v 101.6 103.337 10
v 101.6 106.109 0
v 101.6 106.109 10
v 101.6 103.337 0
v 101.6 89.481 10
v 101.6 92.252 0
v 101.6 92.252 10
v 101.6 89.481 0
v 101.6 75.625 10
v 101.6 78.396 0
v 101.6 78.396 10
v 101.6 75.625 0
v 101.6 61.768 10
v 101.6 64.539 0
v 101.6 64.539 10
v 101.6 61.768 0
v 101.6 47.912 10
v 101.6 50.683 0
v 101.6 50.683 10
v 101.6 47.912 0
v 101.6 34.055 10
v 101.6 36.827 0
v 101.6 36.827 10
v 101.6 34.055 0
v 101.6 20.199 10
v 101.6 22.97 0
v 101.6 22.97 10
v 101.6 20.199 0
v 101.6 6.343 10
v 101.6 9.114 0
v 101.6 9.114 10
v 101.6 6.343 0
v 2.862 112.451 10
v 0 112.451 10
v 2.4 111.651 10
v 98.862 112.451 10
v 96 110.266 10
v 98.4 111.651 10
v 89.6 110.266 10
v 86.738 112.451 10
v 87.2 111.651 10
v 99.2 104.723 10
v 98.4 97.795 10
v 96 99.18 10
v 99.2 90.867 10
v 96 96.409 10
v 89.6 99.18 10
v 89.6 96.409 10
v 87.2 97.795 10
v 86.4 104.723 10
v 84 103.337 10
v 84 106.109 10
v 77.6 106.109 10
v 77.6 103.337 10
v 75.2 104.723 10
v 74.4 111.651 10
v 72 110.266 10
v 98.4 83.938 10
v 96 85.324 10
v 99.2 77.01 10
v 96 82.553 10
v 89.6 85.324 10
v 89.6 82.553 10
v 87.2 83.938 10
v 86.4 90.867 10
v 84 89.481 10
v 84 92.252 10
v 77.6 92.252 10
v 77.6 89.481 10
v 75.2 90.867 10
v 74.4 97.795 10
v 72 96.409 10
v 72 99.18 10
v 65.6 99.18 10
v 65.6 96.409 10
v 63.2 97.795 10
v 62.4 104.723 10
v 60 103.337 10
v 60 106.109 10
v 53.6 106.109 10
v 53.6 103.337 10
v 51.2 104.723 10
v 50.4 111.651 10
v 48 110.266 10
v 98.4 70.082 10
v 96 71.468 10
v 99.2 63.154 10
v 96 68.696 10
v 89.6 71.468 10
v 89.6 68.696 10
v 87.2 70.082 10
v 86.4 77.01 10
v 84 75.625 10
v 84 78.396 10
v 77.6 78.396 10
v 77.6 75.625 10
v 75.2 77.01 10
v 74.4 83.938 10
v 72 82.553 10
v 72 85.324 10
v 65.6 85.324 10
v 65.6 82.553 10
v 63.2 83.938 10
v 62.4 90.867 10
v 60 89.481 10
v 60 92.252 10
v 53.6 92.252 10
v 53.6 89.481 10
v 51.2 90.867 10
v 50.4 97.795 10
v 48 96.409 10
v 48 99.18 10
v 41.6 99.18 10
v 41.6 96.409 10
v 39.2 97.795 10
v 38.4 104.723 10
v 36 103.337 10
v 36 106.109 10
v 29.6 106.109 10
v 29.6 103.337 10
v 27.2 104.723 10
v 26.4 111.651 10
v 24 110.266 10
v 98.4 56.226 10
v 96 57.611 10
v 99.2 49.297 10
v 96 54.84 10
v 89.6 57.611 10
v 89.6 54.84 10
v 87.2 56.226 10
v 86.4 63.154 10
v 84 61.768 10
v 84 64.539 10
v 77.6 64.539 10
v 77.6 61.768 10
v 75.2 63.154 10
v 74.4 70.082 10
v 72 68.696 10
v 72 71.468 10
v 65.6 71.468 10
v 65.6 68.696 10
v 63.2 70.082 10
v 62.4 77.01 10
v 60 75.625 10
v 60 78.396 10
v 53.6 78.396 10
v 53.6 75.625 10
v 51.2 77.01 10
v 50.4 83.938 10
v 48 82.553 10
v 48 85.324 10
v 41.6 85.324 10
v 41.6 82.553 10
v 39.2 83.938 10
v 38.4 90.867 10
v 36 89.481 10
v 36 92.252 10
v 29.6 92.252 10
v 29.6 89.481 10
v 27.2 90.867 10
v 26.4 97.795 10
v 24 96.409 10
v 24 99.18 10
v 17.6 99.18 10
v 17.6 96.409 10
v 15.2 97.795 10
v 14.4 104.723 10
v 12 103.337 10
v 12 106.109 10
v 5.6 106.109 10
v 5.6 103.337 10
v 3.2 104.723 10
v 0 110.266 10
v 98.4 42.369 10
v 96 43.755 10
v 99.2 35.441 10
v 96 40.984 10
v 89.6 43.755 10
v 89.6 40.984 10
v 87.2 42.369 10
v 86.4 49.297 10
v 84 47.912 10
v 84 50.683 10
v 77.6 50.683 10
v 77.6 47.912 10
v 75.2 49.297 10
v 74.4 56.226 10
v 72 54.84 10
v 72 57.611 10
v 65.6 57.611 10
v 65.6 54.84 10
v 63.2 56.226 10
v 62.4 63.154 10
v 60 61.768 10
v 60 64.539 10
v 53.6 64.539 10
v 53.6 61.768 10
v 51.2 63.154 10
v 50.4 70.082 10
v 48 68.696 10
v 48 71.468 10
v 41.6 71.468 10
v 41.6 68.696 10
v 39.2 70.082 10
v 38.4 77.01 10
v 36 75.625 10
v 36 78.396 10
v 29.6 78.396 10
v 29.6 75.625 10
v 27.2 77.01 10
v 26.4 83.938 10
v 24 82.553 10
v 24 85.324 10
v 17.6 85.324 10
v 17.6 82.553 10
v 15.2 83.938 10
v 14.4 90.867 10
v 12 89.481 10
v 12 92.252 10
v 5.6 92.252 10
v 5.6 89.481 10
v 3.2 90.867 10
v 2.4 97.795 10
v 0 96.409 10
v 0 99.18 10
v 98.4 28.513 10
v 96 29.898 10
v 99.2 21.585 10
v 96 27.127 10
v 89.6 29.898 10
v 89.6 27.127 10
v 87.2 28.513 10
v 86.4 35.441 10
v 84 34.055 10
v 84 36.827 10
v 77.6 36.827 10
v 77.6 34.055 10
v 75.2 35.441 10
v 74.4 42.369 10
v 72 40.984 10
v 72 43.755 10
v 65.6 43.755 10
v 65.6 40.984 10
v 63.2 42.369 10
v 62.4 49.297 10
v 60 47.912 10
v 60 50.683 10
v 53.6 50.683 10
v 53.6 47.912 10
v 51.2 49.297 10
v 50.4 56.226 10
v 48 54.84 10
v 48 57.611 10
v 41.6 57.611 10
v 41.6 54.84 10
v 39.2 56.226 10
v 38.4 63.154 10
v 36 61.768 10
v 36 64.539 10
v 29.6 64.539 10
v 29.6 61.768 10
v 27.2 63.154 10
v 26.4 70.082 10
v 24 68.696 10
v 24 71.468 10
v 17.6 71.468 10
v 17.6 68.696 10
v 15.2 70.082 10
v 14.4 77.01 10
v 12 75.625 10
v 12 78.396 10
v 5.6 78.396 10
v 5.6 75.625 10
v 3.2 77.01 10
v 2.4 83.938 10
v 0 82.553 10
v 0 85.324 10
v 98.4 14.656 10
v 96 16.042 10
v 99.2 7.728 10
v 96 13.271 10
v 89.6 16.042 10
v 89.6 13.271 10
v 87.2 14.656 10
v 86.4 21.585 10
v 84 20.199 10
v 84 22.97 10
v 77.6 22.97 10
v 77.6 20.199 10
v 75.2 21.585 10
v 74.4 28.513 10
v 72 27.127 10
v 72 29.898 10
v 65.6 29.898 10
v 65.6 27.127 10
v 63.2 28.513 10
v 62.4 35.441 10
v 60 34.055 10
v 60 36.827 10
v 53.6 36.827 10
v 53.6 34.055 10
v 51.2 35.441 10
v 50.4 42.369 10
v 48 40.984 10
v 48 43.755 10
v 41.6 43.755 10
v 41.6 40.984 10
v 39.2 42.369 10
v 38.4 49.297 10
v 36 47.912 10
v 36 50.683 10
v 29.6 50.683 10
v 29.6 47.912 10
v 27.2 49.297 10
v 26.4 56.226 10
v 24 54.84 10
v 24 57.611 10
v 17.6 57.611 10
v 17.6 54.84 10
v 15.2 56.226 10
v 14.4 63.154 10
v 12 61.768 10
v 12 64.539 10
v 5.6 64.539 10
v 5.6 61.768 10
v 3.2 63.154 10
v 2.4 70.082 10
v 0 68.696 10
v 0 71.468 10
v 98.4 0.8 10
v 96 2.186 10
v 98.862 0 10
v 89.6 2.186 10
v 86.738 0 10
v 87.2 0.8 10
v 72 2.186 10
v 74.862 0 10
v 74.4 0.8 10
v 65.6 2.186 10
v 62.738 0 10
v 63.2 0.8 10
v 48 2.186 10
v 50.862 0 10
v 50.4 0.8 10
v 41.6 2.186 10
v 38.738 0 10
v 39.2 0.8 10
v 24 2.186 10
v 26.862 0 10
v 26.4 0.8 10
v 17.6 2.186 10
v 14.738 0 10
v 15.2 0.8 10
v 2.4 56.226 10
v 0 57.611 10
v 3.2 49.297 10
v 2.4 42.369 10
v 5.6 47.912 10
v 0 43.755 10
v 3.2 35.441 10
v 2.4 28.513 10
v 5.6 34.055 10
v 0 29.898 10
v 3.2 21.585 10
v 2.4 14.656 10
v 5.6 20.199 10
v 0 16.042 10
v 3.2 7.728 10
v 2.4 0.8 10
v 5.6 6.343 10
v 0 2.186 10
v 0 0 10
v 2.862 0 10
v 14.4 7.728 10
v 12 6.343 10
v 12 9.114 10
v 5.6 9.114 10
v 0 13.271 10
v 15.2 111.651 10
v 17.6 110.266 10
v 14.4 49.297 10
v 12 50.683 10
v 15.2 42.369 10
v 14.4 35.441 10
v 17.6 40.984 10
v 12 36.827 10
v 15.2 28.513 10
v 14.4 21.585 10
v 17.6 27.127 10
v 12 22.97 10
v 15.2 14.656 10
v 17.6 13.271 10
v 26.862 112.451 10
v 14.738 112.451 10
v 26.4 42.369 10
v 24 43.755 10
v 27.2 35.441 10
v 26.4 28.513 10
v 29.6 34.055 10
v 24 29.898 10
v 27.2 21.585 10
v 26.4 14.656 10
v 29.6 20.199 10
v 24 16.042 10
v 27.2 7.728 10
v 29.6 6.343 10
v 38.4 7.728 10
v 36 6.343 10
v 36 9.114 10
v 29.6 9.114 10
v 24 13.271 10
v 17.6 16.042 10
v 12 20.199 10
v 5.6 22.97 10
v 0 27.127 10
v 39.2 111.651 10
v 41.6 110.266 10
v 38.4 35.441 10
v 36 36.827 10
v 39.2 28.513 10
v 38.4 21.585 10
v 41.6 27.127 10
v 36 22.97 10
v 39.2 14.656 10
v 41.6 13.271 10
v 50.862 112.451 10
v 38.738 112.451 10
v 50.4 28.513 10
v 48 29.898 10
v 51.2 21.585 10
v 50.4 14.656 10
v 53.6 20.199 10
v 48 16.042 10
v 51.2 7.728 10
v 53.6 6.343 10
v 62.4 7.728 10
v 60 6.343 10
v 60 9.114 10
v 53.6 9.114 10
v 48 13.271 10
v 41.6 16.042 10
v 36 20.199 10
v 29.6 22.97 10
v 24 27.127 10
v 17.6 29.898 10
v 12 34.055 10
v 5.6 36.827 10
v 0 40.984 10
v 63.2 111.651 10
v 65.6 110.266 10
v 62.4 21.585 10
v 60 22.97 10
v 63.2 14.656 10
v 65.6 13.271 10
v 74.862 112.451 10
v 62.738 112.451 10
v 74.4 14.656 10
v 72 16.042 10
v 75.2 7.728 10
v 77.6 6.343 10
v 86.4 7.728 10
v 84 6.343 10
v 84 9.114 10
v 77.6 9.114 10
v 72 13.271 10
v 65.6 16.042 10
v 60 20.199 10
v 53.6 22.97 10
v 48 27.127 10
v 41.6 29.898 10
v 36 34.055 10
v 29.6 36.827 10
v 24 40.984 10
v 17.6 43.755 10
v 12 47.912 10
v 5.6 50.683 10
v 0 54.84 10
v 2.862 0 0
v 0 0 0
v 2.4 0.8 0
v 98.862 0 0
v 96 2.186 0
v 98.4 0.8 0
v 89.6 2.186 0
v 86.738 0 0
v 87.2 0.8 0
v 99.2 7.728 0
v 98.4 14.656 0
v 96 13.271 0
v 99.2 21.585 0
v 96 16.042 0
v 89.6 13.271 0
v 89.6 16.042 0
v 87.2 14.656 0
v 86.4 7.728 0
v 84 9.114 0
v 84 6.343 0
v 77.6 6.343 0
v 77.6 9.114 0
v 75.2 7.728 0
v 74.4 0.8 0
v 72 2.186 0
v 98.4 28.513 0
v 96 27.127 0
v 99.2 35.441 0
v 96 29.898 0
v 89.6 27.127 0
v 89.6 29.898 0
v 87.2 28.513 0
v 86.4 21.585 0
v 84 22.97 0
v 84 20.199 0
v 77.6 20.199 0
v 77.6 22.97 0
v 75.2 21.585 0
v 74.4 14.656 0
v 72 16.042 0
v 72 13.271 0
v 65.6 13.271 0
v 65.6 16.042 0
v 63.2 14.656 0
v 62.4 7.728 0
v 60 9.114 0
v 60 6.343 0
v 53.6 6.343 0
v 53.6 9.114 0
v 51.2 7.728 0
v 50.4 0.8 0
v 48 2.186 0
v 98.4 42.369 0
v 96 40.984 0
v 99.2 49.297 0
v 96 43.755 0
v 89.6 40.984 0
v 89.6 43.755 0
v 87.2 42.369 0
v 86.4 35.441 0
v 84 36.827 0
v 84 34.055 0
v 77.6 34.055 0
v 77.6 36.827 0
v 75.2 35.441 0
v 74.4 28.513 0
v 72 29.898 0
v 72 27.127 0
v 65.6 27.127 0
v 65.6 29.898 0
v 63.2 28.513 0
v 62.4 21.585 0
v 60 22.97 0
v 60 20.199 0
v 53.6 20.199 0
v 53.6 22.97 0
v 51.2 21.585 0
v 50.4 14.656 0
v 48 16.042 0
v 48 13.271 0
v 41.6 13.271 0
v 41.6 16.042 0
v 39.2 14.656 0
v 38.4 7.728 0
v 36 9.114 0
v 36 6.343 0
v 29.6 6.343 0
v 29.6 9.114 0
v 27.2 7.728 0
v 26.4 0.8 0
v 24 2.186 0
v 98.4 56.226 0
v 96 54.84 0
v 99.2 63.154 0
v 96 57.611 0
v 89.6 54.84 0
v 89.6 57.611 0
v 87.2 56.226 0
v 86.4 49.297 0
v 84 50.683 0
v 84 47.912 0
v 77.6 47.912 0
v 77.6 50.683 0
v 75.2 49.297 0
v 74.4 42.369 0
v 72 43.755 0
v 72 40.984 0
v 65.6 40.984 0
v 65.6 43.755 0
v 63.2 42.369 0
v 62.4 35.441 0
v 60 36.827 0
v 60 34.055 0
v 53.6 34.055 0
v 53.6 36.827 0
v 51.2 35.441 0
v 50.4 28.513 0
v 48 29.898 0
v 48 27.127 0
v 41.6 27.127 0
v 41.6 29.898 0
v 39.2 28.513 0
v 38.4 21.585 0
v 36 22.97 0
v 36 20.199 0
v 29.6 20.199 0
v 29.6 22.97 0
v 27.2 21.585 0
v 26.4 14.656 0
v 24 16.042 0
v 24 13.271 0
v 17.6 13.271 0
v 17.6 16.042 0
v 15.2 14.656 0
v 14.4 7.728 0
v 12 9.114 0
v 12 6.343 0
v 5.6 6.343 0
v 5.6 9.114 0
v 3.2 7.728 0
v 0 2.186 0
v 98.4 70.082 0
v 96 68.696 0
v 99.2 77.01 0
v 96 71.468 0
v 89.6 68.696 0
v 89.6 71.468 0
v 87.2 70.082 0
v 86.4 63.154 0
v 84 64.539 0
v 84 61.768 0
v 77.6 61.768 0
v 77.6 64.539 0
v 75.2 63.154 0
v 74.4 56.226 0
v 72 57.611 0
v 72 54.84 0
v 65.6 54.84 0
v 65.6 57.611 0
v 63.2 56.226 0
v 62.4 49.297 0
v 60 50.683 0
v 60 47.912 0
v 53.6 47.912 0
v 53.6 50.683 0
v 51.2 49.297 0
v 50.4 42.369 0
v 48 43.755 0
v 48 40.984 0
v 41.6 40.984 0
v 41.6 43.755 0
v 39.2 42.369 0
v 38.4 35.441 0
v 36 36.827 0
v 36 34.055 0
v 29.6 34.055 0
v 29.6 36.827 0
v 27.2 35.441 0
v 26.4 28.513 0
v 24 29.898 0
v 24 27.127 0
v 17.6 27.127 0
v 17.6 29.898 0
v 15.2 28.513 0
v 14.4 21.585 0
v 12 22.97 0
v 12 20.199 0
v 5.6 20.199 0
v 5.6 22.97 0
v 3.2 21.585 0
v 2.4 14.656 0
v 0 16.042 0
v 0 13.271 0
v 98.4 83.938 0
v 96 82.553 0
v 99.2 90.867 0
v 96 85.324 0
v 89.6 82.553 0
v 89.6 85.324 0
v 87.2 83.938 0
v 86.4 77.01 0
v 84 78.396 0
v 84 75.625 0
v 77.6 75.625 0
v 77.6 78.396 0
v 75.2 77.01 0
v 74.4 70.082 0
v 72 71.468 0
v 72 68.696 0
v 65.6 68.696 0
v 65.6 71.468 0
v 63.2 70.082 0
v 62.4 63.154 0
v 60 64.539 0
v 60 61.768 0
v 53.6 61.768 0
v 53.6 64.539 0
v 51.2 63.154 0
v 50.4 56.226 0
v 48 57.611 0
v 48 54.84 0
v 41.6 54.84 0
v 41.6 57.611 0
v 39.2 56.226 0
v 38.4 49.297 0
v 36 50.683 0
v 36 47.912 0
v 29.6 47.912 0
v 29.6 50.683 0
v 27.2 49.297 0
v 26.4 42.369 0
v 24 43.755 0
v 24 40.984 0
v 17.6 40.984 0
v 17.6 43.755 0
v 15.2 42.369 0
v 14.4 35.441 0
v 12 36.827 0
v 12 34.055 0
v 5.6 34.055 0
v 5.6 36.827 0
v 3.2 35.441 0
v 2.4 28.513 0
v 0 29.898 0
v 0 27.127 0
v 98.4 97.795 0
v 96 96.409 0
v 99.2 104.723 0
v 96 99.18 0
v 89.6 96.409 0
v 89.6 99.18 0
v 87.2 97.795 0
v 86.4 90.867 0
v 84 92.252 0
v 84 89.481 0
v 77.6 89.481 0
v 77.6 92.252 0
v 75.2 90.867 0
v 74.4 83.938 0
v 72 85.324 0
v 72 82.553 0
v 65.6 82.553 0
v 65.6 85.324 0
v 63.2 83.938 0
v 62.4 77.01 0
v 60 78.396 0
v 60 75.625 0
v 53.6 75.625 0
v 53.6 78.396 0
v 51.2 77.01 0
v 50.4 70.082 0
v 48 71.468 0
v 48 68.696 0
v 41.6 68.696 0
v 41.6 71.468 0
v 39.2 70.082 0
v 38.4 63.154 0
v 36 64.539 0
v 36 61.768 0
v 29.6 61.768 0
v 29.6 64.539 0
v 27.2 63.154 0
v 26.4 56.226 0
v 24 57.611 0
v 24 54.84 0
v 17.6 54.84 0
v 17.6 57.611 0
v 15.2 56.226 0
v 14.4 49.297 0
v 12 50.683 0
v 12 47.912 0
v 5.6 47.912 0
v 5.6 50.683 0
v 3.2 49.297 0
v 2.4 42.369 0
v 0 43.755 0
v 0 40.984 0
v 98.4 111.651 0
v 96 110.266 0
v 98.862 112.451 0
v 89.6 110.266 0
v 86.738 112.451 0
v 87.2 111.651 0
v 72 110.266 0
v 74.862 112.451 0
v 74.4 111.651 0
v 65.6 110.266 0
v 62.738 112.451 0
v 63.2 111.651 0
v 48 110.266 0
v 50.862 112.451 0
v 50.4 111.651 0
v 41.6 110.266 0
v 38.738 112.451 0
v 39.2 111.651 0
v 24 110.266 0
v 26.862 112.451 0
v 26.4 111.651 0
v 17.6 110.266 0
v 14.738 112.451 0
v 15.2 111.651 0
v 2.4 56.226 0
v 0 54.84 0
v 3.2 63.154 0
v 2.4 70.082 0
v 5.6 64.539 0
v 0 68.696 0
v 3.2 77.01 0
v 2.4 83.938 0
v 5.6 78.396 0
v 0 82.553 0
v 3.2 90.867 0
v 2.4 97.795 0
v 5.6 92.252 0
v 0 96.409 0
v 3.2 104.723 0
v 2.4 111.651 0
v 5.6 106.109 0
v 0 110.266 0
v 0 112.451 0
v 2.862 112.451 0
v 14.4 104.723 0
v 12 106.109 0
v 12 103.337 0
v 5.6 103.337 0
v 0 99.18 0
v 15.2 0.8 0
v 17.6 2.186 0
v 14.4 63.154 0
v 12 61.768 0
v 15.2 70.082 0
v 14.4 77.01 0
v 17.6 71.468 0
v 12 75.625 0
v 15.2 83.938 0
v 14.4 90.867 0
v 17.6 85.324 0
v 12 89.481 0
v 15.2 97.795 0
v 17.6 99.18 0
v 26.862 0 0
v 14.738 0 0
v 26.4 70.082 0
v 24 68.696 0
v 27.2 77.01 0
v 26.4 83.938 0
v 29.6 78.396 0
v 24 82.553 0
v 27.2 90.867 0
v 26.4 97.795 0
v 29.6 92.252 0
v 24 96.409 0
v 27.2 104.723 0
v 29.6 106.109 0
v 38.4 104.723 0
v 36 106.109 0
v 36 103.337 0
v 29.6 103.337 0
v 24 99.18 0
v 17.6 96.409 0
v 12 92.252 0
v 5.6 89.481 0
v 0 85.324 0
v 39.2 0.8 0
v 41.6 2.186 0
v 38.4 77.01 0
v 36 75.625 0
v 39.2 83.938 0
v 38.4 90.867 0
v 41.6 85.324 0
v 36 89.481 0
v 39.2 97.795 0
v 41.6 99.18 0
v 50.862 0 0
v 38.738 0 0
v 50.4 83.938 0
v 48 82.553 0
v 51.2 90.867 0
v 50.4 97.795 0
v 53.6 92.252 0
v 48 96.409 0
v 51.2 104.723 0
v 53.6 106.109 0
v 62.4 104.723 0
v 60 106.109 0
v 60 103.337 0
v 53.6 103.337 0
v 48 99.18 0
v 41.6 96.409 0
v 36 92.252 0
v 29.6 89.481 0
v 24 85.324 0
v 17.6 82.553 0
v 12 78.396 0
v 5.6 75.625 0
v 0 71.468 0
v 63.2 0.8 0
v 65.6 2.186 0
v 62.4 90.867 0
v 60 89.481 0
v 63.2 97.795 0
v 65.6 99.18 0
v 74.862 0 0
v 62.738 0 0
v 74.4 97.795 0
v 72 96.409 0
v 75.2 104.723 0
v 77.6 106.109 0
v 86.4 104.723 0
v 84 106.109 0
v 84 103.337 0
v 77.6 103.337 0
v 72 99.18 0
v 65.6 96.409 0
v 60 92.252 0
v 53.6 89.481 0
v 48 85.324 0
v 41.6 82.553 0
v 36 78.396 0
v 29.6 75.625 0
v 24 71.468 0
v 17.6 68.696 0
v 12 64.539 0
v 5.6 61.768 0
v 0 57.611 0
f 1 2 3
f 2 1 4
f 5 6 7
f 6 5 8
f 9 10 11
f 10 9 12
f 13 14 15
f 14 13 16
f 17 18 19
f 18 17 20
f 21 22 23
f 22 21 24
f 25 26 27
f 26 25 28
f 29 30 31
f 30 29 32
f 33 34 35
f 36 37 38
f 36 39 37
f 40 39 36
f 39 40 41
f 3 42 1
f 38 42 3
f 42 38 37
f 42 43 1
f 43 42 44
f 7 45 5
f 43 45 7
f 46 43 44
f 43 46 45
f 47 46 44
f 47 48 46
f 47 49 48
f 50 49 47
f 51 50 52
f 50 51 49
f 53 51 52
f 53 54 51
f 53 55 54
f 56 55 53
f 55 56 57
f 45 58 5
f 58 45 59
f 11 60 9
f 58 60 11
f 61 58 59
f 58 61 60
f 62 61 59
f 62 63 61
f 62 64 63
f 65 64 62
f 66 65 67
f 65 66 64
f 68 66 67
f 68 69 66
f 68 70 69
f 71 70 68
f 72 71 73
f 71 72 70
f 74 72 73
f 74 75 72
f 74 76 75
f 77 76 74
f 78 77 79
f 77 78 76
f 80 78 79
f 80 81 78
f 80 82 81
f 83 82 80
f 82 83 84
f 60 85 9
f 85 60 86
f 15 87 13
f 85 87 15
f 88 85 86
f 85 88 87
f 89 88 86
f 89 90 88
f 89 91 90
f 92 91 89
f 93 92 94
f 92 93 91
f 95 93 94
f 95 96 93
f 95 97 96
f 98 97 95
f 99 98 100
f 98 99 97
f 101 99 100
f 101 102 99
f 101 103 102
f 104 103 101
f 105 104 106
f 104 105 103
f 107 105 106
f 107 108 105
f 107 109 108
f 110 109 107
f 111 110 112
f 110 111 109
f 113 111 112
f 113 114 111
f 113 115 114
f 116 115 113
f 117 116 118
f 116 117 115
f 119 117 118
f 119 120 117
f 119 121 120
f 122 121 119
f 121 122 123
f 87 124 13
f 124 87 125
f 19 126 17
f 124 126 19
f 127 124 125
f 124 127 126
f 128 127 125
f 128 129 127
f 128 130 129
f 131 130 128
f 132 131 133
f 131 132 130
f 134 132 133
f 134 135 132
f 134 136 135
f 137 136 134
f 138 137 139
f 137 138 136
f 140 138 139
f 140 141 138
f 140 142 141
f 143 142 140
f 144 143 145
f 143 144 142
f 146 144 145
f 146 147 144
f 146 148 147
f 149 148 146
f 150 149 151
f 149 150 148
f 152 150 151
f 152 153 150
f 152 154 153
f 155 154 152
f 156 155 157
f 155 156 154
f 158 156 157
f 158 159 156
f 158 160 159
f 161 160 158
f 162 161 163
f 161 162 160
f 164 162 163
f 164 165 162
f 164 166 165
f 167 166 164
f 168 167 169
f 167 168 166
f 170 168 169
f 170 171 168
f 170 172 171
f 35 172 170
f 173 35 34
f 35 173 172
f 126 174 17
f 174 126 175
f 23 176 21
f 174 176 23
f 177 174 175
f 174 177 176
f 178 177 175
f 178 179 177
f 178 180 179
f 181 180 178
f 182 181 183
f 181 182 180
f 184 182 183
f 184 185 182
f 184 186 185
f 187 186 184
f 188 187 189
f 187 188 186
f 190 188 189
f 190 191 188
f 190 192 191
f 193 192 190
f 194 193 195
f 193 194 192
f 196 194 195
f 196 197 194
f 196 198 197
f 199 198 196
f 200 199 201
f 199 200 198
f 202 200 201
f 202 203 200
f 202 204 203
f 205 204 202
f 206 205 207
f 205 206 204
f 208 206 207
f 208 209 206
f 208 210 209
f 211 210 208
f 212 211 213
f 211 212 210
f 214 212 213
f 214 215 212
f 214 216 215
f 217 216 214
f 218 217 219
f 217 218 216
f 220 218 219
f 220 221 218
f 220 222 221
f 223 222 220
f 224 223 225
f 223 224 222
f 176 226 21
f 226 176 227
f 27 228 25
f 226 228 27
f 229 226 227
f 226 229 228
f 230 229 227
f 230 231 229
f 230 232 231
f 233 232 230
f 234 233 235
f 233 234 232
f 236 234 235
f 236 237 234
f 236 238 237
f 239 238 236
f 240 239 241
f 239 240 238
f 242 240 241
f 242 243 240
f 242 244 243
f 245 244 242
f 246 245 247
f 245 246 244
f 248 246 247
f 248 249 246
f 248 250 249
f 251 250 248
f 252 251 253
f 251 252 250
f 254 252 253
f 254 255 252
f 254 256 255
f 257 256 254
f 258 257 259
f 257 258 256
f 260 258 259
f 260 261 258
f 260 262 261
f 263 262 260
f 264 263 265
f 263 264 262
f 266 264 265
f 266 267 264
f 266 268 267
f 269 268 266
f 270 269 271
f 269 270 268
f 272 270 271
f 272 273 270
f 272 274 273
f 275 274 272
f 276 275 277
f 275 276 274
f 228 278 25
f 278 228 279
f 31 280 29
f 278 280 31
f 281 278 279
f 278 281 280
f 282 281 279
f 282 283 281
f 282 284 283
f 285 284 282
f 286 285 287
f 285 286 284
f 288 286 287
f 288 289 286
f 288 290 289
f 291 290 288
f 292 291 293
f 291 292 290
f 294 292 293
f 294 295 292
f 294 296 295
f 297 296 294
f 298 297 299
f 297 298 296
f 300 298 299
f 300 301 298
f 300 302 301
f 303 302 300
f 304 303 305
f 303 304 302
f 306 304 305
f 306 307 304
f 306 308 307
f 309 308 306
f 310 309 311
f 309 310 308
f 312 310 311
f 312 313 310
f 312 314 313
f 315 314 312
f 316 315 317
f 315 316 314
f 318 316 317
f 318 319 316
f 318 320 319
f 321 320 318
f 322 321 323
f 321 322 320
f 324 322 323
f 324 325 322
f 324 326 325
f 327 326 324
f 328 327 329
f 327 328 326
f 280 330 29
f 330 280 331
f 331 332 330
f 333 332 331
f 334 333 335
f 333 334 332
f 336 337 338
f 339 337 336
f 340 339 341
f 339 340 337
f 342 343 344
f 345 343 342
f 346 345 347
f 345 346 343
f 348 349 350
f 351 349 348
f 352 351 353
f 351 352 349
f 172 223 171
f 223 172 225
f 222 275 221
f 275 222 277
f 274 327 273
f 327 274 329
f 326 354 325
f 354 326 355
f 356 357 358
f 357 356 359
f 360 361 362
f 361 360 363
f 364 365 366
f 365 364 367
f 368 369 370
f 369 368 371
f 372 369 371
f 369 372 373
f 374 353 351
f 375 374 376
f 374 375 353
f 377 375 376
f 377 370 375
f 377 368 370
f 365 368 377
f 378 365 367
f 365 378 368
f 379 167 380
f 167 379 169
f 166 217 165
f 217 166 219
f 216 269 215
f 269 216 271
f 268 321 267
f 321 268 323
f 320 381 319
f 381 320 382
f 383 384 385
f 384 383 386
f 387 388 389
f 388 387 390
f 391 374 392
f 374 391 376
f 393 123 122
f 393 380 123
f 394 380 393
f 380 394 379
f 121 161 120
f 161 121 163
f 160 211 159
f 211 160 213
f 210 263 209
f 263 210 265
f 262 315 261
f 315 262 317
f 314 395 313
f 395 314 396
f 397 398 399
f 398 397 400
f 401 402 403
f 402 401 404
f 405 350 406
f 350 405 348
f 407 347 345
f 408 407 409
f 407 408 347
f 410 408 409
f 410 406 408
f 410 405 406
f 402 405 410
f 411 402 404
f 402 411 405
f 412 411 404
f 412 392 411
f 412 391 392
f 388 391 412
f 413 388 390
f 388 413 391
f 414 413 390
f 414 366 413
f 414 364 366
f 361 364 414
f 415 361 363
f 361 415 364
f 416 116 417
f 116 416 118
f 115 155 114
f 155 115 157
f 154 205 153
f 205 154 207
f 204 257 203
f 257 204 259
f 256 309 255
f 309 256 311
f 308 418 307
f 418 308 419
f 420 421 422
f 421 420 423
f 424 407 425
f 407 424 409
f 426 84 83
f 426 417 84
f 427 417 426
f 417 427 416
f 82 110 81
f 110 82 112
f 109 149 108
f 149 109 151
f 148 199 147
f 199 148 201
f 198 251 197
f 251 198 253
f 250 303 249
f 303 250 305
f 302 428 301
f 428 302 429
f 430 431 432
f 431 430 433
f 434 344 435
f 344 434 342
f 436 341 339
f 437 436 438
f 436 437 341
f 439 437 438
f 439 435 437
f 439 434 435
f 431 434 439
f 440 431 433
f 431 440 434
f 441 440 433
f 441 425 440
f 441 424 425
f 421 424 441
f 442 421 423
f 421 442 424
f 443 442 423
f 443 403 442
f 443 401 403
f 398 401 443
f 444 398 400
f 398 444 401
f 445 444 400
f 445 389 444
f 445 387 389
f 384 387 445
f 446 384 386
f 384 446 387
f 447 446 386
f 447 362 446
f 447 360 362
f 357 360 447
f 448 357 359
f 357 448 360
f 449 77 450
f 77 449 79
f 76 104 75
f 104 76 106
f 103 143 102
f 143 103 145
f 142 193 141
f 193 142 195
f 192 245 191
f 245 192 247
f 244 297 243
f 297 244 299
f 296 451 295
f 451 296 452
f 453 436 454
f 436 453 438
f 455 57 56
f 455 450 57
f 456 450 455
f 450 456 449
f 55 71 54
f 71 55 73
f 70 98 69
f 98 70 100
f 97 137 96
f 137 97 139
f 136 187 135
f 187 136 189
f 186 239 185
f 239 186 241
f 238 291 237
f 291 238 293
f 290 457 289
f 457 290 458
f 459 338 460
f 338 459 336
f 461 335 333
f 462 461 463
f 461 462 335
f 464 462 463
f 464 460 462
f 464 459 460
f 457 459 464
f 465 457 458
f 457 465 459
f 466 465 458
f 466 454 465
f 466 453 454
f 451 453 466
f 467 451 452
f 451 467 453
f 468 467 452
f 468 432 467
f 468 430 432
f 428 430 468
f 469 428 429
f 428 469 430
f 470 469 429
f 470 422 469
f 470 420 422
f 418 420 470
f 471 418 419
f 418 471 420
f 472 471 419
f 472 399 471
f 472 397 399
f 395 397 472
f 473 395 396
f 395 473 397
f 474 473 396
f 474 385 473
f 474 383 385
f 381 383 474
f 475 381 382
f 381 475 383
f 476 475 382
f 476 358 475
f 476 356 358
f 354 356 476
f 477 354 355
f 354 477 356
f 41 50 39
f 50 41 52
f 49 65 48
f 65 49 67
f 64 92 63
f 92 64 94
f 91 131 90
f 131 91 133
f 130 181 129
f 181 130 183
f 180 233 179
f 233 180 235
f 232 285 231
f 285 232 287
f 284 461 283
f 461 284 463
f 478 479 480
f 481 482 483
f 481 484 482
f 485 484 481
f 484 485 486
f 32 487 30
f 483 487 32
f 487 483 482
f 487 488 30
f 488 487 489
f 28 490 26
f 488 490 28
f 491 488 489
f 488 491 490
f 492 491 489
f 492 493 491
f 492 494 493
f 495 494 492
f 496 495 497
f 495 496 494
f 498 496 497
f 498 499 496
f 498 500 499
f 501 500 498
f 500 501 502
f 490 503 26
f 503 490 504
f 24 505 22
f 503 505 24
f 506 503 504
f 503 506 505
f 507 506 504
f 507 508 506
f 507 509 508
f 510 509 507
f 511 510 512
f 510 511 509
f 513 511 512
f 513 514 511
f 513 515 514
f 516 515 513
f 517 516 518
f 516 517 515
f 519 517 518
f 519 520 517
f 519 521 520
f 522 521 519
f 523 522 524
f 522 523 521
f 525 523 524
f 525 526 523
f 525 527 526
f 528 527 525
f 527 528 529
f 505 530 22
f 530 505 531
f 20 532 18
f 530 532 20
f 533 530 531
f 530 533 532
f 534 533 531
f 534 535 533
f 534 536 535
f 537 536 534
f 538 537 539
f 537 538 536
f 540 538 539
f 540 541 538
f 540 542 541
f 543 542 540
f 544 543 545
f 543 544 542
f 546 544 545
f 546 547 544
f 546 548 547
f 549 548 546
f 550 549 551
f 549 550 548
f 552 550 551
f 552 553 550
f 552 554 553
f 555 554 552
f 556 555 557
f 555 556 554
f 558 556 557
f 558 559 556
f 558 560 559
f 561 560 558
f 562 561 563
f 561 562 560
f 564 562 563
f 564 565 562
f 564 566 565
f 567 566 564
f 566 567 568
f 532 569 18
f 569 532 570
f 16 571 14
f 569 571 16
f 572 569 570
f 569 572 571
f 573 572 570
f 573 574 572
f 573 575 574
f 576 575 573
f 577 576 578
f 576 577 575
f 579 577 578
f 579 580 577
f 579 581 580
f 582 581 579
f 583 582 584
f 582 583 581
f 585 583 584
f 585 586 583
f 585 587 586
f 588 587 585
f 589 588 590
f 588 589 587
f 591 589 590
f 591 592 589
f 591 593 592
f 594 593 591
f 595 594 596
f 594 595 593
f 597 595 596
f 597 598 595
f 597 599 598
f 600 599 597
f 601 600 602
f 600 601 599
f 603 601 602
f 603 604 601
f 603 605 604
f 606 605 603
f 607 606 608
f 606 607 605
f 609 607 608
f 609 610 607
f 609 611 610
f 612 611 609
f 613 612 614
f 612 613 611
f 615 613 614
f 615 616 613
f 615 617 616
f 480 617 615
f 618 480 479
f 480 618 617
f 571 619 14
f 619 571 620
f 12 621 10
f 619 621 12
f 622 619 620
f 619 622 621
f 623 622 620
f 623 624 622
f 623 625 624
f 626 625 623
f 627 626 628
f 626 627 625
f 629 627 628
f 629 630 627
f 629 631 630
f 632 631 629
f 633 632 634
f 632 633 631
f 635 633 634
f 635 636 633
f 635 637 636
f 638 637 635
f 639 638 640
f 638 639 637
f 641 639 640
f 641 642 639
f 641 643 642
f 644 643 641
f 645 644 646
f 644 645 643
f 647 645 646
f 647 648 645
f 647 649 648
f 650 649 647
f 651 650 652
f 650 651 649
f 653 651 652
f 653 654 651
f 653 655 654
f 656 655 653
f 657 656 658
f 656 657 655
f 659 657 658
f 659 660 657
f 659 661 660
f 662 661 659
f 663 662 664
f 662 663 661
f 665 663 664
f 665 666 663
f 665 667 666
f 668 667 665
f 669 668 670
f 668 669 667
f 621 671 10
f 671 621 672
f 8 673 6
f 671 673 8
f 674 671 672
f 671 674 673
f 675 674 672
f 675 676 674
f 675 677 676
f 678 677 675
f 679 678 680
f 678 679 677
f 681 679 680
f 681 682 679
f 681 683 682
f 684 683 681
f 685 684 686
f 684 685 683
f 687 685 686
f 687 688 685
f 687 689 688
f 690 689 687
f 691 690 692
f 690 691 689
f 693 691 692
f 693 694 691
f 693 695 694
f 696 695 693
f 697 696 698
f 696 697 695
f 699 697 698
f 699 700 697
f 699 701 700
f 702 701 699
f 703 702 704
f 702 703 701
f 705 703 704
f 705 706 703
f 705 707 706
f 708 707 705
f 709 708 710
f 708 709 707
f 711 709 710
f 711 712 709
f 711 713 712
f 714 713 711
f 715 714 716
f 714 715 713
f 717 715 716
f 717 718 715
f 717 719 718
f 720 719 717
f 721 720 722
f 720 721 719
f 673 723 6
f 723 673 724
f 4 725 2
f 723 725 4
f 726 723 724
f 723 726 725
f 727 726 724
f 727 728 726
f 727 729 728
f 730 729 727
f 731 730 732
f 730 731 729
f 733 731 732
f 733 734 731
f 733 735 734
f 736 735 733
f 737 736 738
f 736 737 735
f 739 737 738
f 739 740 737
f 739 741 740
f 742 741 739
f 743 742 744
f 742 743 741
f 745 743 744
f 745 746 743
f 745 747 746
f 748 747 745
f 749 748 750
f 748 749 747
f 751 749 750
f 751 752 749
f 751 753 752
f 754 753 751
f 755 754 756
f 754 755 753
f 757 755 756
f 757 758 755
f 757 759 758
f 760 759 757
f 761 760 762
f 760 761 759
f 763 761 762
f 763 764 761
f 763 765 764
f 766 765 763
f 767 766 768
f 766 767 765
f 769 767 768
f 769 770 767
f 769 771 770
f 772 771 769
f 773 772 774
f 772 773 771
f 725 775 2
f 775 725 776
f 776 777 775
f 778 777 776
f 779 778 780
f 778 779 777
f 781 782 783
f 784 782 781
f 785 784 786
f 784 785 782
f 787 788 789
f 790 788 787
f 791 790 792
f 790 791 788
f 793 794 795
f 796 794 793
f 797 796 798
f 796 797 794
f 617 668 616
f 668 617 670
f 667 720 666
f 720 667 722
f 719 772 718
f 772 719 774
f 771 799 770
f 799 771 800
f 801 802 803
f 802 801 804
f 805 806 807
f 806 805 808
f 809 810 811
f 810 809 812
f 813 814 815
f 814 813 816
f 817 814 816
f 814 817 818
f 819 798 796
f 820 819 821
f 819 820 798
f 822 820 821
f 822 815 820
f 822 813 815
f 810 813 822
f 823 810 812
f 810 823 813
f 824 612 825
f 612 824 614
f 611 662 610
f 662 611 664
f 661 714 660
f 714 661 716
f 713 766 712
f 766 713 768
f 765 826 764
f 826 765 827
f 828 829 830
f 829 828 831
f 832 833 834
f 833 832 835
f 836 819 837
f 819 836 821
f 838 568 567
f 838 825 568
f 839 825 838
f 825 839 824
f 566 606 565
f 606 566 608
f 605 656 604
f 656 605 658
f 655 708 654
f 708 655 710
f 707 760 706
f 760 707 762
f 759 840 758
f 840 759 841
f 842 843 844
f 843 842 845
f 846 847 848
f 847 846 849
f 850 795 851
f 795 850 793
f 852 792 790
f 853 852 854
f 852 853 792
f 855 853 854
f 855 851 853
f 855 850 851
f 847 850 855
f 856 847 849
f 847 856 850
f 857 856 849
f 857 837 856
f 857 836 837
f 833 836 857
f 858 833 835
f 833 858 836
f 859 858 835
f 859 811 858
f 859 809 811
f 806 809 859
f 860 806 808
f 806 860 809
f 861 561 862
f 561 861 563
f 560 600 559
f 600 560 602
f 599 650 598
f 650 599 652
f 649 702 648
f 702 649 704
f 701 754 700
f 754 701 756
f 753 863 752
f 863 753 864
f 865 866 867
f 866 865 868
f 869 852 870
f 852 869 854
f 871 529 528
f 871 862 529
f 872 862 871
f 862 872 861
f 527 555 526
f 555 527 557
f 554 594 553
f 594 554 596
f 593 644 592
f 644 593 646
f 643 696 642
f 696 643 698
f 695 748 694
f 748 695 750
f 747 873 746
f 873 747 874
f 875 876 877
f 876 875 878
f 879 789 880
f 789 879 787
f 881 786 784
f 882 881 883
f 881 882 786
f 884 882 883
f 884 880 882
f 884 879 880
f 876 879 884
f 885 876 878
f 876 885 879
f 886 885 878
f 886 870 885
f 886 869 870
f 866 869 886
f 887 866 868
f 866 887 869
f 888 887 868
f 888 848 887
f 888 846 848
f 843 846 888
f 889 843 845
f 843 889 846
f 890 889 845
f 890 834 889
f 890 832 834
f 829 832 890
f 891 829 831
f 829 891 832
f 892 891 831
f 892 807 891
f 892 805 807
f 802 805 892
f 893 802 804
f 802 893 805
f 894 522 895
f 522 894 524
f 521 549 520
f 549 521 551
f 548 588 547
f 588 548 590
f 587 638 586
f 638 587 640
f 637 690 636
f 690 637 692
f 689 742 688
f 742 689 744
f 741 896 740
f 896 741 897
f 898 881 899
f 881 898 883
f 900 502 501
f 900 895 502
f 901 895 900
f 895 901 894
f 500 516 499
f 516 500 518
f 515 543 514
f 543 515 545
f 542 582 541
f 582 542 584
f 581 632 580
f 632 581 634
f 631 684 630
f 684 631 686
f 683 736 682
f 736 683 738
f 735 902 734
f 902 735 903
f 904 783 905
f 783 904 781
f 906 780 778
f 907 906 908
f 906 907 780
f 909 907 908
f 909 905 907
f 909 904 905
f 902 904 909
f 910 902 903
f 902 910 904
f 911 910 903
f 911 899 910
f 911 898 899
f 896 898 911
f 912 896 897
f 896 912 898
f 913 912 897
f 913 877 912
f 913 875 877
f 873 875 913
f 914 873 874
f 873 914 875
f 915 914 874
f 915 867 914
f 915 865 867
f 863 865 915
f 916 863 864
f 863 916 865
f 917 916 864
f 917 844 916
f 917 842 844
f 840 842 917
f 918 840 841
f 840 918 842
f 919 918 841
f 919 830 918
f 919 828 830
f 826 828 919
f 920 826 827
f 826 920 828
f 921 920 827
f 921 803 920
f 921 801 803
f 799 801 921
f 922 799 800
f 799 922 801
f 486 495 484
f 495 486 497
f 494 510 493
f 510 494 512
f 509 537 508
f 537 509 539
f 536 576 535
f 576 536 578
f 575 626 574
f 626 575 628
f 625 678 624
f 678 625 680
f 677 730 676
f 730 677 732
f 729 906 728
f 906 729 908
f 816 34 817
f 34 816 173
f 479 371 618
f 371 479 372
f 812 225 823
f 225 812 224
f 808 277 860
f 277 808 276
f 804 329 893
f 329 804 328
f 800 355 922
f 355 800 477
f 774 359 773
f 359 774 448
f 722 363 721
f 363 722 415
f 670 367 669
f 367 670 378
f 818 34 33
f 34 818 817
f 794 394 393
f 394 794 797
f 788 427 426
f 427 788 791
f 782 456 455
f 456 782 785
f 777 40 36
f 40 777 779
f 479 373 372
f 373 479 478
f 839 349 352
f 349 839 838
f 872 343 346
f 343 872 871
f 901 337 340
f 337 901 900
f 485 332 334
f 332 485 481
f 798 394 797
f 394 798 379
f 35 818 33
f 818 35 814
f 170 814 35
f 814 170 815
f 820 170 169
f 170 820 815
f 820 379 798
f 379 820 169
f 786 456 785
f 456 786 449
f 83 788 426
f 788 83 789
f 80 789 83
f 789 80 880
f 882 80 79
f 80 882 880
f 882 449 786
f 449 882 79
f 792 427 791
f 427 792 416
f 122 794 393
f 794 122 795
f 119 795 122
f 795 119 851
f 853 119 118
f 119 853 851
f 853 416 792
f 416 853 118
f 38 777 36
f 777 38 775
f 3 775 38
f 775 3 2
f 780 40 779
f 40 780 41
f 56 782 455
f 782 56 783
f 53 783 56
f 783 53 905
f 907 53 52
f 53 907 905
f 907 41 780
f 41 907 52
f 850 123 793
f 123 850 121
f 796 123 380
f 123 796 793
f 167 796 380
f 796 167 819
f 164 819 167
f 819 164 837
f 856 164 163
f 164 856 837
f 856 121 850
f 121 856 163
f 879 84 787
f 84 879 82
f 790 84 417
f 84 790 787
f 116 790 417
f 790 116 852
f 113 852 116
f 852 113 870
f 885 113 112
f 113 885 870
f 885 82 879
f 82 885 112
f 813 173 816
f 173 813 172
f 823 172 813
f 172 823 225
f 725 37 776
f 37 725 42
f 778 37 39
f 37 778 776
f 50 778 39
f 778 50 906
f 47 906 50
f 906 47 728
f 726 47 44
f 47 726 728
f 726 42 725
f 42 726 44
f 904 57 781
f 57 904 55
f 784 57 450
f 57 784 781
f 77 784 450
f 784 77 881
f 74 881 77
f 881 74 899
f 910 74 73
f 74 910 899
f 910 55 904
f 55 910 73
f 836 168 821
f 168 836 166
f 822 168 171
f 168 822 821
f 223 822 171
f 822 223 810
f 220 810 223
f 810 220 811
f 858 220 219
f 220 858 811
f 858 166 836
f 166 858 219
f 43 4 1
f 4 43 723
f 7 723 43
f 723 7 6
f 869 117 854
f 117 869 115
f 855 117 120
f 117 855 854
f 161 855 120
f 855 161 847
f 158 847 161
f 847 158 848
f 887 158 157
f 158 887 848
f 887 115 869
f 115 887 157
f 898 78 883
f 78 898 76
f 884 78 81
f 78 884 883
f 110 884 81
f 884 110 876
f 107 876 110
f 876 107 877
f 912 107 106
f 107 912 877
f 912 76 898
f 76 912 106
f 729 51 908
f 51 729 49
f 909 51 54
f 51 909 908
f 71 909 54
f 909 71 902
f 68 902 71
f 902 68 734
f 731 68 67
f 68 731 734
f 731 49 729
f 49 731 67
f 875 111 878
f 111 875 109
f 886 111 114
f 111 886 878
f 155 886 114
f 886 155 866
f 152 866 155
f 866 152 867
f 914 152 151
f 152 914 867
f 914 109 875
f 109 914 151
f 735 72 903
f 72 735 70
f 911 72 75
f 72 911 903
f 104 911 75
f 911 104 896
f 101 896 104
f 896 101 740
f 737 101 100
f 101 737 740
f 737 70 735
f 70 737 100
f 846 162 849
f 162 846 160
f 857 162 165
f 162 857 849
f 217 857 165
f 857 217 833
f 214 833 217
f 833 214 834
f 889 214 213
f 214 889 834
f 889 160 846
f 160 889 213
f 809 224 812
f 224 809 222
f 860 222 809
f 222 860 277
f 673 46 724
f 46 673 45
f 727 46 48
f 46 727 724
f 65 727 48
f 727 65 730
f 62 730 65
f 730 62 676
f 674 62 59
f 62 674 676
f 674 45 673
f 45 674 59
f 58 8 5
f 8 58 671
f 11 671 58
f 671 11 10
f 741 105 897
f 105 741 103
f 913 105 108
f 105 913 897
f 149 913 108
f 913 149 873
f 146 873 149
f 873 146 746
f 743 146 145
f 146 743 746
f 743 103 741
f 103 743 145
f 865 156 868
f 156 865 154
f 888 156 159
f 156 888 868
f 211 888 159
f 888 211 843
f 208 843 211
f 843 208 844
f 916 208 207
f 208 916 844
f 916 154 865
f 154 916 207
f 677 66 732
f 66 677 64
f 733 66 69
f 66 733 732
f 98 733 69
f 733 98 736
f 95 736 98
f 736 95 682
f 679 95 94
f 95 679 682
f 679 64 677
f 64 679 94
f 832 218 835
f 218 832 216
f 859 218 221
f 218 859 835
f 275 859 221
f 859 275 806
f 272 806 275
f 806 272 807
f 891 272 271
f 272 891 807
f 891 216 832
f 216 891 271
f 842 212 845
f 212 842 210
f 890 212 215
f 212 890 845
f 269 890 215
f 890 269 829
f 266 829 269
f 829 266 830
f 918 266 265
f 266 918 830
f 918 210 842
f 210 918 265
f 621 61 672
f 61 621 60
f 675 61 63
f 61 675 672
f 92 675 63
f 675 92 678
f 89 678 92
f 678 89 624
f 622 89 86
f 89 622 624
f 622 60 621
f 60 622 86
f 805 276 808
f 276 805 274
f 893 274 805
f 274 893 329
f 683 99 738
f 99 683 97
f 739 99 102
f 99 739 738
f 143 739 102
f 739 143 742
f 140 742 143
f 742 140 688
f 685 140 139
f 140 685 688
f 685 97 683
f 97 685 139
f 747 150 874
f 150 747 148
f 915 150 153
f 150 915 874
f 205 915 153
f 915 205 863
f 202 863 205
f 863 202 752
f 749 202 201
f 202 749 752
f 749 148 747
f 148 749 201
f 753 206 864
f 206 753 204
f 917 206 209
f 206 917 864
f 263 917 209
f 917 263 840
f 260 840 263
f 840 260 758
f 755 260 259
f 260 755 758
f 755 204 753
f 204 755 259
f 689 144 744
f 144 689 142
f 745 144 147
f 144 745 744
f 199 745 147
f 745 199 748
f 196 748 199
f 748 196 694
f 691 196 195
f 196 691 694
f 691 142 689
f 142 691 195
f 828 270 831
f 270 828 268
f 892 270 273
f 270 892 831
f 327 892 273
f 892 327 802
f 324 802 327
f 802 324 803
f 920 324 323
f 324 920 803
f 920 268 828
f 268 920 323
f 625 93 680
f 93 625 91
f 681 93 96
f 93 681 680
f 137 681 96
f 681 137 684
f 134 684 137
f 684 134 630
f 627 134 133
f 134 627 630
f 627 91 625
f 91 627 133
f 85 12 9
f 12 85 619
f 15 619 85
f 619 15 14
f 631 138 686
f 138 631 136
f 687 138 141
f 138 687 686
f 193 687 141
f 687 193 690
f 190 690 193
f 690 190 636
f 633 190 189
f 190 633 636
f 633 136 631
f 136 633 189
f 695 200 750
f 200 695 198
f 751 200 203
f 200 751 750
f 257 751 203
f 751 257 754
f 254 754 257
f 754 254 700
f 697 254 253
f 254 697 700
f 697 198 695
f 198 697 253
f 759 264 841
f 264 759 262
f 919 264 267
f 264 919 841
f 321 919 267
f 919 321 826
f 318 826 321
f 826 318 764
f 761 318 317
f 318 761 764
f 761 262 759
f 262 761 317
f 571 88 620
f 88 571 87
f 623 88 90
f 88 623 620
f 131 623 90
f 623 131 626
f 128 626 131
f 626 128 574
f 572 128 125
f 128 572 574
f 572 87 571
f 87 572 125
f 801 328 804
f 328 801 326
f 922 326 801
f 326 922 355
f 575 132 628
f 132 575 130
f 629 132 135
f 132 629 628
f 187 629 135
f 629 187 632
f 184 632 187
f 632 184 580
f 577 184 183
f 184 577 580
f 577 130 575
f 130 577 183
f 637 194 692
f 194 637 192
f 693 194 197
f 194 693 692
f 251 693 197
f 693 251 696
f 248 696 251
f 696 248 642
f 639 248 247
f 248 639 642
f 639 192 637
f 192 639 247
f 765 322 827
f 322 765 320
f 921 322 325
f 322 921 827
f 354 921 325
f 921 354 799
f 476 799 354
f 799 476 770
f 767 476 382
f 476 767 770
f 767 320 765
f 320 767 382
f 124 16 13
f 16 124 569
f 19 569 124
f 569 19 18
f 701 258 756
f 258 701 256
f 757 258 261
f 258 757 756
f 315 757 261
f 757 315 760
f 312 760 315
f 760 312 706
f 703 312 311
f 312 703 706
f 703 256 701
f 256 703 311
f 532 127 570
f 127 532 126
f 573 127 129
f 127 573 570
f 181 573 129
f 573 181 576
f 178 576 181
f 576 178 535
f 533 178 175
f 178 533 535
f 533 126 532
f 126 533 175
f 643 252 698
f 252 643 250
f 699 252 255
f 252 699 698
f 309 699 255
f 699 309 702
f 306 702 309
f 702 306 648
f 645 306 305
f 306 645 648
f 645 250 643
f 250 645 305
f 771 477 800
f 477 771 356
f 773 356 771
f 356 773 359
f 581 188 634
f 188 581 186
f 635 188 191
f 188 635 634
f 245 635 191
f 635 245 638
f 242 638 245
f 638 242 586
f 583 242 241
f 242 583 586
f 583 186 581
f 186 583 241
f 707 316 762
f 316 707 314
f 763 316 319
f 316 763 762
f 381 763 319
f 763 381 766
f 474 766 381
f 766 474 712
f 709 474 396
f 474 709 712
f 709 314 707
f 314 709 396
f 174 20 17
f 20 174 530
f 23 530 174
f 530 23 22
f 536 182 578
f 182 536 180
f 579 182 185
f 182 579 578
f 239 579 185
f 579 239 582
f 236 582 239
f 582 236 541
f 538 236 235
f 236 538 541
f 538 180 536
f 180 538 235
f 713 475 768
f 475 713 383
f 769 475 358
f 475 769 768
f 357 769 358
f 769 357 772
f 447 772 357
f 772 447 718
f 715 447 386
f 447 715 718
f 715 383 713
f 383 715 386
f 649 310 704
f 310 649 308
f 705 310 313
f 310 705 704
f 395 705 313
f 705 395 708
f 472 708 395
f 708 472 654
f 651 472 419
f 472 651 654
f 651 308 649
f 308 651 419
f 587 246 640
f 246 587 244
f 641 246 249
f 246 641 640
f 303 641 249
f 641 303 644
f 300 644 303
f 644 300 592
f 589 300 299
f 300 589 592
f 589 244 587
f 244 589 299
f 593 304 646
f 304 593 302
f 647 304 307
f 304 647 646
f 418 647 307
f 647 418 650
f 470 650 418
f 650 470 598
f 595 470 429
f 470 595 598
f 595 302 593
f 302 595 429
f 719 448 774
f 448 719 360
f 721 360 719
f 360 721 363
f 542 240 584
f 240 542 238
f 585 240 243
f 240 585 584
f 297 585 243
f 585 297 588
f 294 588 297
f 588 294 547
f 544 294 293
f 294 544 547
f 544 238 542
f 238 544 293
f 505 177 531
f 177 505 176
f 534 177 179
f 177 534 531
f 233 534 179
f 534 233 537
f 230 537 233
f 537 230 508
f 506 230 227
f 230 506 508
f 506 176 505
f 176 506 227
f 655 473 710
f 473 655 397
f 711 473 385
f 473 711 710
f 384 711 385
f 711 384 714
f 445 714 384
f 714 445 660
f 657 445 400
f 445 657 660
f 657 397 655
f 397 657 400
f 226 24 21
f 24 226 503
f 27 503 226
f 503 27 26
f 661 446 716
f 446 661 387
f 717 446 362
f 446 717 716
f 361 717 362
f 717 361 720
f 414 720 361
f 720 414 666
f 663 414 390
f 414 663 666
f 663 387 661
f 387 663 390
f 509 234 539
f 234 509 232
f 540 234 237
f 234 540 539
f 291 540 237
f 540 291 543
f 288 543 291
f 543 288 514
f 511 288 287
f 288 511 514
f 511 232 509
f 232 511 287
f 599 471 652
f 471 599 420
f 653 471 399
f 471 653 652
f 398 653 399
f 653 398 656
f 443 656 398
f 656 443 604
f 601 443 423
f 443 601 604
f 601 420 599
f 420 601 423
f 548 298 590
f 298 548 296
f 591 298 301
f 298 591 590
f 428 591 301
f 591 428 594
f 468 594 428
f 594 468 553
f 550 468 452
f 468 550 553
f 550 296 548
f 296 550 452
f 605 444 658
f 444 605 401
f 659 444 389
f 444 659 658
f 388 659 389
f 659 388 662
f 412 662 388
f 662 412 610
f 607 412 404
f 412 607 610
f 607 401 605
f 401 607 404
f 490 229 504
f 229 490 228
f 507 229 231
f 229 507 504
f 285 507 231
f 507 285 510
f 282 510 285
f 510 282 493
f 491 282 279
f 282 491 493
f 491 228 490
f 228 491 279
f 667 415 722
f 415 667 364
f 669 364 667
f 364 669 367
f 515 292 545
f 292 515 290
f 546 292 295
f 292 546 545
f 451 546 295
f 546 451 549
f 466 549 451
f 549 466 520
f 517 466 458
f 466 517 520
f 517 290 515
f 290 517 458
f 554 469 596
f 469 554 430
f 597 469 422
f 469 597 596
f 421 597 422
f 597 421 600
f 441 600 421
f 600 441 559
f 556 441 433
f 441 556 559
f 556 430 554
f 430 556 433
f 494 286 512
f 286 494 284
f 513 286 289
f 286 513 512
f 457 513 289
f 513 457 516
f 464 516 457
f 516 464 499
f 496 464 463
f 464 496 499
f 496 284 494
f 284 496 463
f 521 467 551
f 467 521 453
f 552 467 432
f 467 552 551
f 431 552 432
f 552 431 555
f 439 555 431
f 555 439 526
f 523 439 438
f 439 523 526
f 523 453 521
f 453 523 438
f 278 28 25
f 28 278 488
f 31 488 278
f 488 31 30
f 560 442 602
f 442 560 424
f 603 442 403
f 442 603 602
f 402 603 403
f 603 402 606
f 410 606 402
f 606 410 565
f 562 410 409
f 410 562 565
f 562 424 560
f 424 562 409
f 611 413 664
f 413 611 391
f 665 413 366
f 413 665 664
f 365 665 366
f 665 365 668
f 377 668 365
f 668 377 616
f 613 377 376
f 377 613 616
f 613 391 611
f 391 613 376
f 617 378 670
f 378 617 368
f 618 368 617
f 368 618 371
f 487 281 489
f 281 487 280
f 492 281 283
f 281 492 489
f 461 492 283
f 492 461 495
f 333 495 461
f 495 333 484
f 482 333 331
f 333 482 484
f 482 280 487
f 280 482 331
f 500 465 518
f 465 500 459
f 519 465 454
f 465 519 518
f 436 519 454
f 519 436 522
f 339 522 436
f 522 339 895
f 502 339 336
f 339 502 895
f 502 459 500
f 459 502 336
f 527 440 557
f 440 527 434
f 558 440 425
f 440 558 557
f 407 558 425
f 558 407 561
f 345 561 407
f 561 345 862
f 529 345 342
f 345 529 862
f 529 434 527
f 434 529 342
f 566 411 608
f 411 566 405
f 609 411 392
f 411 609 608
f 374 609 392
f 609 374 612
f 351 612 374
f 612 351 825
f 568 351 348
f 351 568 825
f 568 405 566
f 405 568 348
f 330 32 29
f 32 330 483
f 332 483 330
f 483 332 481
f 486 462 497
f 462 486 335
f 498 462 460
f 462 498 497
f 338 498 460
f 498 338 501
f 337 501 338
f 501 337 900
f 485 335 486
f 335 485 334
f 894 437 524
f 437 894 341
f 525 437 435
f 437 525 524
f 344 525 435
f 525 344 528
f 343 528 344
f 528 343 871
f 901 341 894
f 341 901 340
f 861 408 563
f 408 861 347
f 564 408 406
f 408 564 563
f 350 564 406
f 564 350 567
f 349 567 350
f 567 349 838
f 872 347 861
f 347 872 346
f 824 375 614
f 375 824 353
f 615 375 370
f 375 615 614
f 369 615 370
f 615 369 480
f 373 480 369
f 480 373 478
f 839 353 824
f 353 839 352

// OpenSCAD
// honeycomb generator
// generic library functions for parametric honeycomb creation

// 2016Sep10, v0.0.1, ls (http://www.thingiverse.com/Bushmills)
//                    initial version
// 2016Sep28, v0.0.2  circle with $fn=6 is faster than 3 rotated rectangles
//    

// use:
// honeycomb(cells wide, cells long, base plate thickness, cell size, height, wall to cell size percentage );


// *******************************************************************************************************************
// ******************************* remove this section when using this file as library *******************************
// *******************************     present only for the thingiverse customiser     *******************************
// *******************************************************************************************************************

columns=8;			// [2:255]

rows=8;         		// [2:255]

base_plate_thickness=0;	// [0:0.1:15]

cell_size=8;                    // [0.3:0.1:20]

height=10;			// [0.2:0.1:200]

fill=20;				// [1:99]

// example:
honeycomb(columns, rows, base_plate_thickness, cell_size, height, fill);

// *******************************************************************************************************************


sqrt3=sqrt(3);			
little=0.01;	// improve preview quality

// a single filled hexagon
module hexagon(l)  {
	circle(l, $fn=6);			// faster
//	for (a=[-60:60:60])  {			// previous method is slower
//		rotate([0, 0, a])
//		square([l, sqrt3*l], center=true);
//	}
}

// parametric honeycomb  
module honeycomb(x, y, base, cell, h, fill)  {
	w=cell*fill/100;						// calculate wall thickness
	echo("wall:", w);						// display (walls won't get printed when too thin)

	difference()  {
		cube([(1.5*x+0.5)*cell+w, cell*sqrt3*y+1.5*w-w/2, h]);	// rectangular plate

		translate([w-cell*2, w, base-little/2])
		linear_extrude(h+little)  {				// punch with matrix of hexagonal prisms
			for (a=[0:x/2+1], b=[0:y], c=[0:1/2:1/2])
			translate([(a+c)*3*cell-w/2, (b+c)*sqrt3*cell-w/2])
			hexagon(cell-w);
		}
	}
}
